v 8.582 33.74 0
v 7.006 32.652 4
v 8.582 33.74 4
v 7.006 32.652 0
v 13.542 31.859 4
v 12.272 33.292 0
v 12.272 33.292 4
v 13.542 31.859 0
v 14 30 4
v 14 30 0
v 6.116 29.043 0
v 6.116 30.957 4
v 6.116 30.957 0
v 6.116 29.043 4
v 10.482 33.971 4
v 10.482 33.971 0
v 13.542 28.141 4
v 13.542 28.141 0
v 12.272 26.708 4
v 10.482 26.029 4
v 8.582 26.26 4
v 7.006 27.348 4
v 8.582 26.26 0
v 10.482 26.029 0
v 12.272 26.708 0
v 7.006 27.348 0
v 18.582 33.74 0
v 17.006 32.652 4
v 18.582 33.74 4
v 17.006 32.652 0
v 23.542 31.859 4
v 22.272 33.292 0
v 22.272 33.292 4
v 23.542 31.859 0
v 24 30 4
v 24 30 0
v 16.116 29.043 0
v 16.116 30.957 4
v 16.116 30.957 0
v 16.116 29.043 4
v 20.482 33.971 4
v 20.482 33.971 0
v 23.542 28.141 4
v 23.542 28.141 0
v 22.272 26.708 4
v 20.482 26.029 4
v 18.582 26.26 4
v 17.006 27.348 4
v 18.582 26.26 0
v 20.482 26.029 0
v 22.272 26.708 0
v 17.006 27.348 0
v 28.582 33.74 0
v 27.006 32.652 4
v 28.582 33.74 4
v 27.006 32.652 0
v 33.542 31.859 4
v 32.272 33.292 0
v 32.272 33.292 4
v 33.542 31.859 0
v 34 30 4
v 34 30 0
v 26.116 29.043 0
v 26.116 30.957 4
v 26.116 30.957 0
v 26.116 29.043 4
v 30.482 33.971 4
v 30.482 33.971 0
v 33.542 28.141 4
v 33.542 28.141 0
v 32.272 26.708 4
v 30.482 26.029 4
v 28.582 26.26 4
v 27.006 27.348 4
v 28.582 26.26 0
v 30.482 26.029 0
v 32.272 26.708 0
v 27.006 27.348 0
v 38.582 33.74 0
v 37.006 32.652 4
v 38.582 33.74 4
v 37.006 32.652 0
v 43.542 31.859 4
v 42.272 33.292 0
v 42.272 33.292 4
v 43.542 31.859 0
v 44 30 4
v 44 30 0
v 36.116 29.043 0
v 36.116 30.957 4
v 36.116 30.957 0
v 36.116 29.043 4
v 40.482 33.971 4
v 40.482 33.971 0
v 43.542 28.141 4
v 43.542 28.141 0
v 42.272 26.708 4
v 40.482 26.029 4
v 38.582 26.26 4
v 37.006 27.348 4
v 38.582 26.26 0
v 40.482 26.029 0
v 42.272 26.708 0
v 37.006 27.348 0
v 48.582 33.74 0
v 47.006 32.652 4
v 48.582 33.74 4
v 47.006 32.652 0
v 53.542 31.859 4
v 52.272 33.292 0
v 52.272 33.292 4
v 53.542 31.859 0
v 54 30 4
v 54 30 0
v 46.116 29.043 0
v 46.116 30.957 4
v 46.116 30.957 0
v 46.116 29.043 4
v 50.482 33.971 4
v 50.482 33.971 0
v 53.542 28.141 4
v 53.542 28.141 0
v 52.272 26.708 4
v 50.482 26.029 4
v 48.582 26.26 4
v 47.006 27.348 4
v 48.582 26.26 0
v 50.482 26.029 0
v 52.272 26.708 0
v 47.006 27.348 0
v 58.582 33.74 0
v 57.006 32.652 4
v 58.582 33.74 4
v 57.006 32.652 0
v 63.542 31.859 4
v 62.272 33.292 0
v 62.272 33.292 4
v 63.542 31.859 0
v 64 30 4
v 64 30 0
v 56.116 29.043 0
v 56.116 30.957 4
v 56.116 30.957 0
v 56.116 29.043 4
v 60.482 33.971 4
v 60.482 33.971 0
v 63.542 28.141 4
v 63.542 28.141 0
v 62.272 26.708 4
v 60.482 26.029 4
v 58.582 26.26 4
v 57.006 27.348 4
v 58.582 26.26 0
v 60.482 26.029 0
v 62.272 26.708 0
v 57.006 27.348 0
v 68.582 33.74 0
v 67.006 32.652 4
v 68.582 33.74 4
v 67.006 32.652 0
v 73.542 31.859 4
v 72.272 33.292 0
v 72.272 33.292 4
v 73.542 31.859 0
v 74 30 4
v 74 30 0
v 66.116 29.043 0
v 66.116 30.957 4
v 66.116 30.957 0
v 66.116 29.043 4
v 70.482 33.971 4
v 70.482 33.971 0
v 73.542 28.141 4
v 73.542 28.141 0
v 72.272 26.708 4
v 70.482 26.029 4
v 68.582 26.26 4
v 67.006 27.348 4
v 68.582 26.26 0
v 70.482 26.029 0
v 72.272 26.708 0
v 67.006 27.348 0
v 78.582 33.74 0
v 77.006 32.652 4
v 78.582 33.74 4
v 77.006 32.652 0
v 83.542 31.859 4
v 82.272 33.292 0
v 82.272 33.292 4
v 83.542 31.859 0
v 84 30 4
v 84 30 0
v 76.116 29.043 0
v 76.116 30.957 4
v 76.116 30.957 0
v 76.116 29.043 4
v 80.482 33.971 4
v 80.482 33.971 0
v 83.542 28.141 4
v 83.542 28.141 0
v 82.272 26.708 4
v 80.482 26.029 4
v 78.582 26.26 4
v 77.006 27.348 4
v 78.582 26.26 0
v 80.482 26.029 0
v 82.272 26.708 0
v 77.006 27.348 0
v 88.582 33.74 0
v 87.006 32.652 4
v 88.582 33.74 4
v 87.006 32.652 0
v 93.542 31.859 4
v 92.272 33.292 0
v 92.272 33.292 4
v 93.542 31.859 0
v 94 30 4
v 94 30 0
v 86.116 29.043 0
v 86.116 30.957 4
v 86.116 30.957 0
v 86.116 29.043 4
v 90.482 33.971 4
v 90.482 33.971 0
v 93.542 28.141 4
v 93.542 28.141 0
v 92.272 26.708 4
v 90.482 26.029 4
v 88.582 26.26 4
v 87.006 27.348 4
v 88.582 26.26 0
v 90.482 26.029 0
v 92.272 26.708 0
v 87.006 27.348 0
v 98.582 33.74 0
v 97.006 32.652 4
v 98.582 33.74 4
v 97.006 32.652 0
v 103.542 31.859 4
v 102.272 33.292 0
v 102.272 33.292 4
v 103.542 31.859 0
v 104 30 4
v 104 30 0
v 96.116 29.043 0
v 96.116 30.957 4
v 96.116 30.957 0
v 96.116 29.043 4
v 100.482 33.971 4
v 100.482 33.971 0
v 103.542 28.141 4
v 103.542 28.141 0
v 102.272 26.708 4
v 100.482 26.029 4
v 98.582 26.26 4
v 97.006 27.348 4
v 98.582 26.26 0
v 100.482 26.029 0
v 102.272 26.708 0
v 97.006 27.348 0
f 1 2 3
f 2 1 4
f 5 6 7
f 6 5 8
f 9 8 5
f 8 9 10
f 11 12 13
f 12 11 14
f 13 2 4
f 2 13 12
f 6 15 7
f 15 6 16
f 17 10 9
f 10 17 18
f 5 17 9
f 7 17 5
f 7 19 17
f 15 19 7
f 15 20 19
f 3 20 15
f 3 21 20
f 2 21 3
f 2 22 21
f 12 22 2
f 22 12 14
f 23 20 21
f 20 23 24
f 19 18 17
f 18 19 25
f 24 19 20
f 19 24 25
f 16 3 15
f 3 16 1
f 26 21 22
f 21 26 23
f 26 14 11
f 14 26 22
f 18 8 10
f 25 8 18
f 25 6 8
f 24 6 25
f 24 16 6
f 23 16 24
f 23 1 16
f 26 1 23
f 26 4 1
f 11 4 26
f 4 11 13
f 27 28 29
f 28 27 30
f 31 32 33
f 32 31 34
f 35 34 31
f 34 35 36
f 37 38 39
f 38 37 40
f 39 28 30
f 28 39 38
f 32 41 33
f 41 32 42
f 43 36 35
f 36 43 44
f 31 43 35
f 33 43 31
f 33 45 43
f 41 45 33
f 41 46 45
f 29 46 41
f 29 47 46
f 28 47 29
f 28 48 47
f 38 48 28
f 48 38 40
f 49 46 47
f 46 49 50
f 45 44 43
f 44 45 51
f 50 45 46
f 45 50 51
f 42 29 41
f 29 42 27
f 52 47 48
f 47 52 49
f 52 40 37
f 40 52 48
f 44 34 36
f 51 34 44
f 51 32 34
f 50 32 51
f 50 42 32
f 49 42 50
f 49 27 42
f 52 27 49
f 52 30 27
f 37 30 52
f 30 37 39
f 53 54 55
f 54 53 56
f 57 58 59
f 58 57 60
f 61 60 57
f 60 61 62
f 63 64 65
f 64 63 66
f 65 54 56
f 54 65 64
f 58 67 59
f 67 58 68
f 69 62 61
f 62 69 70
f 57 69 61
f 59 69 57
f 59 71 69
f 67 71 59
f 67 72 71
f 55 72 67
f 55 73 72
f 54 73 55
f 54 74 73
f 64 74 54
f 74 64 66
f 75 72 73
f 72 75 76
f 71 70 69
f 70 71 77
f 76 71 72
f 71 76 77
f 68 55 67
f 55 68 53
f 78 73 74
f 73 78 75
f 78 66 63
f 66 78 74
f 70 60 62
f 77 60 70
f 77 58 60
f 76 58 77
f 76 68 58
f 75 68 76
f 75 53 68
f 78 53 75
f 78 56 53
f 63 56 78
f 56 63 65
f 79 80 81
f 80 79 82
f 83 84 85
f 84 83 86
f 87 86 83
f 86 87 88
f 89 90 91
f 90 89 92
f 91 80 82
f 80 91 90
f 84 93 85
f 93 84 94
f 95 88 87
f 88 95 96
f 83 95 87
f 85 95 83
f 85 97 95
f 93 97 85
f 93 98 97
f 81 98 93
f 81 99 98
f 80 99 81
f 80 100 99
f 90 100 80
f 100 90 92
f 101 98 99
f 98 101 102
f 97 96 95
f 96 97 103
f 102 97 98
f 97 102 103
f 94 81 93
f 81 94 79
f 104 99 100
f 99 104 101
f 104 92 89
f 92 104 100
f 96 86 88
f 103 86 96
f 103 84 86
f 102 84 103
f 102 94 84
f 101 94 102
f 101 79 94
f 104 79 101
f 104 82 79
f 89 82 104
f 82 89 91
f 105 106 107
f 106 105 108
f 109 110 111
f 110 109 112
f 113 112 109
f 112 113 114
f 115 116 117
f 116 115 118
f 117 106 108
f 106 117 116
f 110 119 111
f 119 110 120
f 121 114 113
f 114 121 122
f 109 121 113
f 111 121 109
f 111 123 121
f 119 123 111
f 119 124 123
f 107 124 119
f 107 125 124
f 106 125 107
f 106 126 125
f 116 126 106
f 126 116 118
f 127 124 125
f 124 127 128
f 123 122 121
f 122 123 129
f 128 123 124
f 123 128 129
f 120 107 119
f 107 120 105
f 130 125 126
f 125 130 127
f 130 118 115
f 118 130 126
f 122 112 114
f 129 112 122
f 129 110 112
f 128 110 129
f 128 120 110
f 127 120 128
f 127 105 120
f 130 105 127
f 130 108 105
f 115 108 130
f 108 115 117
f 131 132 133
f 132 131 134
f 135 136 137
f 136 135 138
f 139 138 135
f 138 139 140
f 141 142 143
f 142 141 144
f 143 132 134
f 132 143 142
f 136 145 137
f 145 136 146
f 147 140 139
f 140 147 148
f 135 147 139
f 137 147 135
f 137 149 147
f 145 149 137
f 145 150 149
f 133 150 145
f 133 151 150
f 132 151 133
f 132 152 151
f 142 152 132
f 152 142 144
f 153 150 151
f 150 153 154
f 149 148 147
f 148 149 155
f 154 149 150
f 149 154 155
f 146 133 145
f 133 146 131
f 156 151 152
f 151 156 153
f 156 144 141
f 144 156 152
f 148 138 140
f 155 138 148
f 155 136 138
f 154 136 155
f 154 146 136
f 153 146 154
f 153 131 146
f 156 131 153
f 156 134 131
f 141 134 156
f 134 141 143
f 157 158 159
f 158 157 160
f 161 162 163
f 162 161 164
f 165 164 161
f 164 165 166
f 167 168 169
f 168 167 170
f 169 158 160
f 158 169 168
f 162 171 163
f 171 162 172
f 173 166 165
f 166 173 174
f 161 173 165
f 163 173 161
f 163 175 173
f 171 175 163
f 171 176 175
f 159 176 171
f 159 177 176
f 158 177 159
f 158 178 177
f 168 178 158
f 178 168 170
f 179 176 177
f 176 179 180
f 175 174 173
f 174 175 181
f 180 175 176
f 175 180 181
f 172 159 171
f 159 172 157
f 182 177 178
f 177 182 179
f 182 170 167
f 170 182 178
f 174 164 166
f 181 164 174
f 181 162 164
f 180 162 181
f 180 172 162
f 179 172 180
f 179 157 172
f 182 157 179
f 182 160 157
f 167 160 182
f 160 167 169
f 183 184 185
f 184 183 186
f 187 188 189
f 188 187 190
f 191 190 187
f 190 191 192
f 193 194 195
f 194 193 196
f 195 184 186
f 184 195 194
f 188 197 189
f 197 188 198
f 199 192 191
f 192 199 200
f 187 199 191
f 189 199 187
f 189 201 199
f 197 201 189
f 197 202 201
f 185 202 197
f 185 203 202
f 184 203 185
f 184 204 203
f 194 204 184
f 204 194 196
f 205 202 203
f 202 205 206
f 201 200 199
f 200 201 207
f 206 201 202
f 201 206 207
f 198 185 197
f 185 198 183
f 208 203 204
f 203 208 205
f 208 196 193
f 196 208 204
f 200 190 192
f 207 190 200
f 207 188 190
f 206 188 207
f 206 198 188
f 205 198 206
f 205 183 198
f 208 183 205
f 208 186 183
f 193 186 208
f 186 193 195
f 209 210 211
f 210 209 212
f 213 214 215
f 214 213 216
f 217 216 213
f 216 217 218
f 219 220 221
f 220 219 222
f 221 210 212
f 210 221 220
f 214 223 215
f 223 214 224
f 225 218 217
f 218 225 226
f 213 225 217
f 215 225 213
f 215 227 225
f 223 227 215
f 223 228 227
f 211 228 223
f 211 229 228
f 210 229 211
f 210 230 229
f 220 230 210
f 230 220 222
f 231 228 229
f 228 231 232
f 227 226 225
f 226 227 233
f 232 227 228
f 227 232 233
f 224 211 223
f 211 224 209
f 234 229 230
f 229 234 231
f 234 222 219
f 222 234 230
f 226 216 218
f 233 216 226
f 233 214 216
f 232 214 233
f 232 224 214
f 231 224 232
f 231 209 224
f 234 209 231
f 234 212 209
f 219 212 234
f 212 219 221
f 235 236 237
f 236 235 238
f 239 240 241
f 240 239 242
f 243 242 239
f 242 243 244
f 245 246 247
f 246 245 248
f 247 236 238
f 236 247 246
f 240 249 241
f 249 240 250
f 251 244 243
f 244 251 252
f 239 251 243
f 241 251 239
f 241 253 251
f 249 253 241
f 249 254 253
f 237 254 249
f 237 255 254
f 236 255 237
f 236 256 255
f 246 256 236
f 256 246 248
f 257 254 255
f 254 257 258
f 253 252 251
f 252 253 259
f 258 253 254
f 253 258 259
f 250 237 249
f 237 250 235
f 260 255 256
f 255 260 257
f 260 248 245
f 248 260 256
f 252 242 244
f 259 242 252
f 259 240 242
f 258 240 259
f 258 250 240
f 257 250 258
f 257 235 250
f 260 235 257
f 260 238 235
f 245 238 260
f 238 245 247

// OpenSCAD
for(x=[10:10:100])
	translate([x, 30, 0]) cylinder(h=4, r=4);
